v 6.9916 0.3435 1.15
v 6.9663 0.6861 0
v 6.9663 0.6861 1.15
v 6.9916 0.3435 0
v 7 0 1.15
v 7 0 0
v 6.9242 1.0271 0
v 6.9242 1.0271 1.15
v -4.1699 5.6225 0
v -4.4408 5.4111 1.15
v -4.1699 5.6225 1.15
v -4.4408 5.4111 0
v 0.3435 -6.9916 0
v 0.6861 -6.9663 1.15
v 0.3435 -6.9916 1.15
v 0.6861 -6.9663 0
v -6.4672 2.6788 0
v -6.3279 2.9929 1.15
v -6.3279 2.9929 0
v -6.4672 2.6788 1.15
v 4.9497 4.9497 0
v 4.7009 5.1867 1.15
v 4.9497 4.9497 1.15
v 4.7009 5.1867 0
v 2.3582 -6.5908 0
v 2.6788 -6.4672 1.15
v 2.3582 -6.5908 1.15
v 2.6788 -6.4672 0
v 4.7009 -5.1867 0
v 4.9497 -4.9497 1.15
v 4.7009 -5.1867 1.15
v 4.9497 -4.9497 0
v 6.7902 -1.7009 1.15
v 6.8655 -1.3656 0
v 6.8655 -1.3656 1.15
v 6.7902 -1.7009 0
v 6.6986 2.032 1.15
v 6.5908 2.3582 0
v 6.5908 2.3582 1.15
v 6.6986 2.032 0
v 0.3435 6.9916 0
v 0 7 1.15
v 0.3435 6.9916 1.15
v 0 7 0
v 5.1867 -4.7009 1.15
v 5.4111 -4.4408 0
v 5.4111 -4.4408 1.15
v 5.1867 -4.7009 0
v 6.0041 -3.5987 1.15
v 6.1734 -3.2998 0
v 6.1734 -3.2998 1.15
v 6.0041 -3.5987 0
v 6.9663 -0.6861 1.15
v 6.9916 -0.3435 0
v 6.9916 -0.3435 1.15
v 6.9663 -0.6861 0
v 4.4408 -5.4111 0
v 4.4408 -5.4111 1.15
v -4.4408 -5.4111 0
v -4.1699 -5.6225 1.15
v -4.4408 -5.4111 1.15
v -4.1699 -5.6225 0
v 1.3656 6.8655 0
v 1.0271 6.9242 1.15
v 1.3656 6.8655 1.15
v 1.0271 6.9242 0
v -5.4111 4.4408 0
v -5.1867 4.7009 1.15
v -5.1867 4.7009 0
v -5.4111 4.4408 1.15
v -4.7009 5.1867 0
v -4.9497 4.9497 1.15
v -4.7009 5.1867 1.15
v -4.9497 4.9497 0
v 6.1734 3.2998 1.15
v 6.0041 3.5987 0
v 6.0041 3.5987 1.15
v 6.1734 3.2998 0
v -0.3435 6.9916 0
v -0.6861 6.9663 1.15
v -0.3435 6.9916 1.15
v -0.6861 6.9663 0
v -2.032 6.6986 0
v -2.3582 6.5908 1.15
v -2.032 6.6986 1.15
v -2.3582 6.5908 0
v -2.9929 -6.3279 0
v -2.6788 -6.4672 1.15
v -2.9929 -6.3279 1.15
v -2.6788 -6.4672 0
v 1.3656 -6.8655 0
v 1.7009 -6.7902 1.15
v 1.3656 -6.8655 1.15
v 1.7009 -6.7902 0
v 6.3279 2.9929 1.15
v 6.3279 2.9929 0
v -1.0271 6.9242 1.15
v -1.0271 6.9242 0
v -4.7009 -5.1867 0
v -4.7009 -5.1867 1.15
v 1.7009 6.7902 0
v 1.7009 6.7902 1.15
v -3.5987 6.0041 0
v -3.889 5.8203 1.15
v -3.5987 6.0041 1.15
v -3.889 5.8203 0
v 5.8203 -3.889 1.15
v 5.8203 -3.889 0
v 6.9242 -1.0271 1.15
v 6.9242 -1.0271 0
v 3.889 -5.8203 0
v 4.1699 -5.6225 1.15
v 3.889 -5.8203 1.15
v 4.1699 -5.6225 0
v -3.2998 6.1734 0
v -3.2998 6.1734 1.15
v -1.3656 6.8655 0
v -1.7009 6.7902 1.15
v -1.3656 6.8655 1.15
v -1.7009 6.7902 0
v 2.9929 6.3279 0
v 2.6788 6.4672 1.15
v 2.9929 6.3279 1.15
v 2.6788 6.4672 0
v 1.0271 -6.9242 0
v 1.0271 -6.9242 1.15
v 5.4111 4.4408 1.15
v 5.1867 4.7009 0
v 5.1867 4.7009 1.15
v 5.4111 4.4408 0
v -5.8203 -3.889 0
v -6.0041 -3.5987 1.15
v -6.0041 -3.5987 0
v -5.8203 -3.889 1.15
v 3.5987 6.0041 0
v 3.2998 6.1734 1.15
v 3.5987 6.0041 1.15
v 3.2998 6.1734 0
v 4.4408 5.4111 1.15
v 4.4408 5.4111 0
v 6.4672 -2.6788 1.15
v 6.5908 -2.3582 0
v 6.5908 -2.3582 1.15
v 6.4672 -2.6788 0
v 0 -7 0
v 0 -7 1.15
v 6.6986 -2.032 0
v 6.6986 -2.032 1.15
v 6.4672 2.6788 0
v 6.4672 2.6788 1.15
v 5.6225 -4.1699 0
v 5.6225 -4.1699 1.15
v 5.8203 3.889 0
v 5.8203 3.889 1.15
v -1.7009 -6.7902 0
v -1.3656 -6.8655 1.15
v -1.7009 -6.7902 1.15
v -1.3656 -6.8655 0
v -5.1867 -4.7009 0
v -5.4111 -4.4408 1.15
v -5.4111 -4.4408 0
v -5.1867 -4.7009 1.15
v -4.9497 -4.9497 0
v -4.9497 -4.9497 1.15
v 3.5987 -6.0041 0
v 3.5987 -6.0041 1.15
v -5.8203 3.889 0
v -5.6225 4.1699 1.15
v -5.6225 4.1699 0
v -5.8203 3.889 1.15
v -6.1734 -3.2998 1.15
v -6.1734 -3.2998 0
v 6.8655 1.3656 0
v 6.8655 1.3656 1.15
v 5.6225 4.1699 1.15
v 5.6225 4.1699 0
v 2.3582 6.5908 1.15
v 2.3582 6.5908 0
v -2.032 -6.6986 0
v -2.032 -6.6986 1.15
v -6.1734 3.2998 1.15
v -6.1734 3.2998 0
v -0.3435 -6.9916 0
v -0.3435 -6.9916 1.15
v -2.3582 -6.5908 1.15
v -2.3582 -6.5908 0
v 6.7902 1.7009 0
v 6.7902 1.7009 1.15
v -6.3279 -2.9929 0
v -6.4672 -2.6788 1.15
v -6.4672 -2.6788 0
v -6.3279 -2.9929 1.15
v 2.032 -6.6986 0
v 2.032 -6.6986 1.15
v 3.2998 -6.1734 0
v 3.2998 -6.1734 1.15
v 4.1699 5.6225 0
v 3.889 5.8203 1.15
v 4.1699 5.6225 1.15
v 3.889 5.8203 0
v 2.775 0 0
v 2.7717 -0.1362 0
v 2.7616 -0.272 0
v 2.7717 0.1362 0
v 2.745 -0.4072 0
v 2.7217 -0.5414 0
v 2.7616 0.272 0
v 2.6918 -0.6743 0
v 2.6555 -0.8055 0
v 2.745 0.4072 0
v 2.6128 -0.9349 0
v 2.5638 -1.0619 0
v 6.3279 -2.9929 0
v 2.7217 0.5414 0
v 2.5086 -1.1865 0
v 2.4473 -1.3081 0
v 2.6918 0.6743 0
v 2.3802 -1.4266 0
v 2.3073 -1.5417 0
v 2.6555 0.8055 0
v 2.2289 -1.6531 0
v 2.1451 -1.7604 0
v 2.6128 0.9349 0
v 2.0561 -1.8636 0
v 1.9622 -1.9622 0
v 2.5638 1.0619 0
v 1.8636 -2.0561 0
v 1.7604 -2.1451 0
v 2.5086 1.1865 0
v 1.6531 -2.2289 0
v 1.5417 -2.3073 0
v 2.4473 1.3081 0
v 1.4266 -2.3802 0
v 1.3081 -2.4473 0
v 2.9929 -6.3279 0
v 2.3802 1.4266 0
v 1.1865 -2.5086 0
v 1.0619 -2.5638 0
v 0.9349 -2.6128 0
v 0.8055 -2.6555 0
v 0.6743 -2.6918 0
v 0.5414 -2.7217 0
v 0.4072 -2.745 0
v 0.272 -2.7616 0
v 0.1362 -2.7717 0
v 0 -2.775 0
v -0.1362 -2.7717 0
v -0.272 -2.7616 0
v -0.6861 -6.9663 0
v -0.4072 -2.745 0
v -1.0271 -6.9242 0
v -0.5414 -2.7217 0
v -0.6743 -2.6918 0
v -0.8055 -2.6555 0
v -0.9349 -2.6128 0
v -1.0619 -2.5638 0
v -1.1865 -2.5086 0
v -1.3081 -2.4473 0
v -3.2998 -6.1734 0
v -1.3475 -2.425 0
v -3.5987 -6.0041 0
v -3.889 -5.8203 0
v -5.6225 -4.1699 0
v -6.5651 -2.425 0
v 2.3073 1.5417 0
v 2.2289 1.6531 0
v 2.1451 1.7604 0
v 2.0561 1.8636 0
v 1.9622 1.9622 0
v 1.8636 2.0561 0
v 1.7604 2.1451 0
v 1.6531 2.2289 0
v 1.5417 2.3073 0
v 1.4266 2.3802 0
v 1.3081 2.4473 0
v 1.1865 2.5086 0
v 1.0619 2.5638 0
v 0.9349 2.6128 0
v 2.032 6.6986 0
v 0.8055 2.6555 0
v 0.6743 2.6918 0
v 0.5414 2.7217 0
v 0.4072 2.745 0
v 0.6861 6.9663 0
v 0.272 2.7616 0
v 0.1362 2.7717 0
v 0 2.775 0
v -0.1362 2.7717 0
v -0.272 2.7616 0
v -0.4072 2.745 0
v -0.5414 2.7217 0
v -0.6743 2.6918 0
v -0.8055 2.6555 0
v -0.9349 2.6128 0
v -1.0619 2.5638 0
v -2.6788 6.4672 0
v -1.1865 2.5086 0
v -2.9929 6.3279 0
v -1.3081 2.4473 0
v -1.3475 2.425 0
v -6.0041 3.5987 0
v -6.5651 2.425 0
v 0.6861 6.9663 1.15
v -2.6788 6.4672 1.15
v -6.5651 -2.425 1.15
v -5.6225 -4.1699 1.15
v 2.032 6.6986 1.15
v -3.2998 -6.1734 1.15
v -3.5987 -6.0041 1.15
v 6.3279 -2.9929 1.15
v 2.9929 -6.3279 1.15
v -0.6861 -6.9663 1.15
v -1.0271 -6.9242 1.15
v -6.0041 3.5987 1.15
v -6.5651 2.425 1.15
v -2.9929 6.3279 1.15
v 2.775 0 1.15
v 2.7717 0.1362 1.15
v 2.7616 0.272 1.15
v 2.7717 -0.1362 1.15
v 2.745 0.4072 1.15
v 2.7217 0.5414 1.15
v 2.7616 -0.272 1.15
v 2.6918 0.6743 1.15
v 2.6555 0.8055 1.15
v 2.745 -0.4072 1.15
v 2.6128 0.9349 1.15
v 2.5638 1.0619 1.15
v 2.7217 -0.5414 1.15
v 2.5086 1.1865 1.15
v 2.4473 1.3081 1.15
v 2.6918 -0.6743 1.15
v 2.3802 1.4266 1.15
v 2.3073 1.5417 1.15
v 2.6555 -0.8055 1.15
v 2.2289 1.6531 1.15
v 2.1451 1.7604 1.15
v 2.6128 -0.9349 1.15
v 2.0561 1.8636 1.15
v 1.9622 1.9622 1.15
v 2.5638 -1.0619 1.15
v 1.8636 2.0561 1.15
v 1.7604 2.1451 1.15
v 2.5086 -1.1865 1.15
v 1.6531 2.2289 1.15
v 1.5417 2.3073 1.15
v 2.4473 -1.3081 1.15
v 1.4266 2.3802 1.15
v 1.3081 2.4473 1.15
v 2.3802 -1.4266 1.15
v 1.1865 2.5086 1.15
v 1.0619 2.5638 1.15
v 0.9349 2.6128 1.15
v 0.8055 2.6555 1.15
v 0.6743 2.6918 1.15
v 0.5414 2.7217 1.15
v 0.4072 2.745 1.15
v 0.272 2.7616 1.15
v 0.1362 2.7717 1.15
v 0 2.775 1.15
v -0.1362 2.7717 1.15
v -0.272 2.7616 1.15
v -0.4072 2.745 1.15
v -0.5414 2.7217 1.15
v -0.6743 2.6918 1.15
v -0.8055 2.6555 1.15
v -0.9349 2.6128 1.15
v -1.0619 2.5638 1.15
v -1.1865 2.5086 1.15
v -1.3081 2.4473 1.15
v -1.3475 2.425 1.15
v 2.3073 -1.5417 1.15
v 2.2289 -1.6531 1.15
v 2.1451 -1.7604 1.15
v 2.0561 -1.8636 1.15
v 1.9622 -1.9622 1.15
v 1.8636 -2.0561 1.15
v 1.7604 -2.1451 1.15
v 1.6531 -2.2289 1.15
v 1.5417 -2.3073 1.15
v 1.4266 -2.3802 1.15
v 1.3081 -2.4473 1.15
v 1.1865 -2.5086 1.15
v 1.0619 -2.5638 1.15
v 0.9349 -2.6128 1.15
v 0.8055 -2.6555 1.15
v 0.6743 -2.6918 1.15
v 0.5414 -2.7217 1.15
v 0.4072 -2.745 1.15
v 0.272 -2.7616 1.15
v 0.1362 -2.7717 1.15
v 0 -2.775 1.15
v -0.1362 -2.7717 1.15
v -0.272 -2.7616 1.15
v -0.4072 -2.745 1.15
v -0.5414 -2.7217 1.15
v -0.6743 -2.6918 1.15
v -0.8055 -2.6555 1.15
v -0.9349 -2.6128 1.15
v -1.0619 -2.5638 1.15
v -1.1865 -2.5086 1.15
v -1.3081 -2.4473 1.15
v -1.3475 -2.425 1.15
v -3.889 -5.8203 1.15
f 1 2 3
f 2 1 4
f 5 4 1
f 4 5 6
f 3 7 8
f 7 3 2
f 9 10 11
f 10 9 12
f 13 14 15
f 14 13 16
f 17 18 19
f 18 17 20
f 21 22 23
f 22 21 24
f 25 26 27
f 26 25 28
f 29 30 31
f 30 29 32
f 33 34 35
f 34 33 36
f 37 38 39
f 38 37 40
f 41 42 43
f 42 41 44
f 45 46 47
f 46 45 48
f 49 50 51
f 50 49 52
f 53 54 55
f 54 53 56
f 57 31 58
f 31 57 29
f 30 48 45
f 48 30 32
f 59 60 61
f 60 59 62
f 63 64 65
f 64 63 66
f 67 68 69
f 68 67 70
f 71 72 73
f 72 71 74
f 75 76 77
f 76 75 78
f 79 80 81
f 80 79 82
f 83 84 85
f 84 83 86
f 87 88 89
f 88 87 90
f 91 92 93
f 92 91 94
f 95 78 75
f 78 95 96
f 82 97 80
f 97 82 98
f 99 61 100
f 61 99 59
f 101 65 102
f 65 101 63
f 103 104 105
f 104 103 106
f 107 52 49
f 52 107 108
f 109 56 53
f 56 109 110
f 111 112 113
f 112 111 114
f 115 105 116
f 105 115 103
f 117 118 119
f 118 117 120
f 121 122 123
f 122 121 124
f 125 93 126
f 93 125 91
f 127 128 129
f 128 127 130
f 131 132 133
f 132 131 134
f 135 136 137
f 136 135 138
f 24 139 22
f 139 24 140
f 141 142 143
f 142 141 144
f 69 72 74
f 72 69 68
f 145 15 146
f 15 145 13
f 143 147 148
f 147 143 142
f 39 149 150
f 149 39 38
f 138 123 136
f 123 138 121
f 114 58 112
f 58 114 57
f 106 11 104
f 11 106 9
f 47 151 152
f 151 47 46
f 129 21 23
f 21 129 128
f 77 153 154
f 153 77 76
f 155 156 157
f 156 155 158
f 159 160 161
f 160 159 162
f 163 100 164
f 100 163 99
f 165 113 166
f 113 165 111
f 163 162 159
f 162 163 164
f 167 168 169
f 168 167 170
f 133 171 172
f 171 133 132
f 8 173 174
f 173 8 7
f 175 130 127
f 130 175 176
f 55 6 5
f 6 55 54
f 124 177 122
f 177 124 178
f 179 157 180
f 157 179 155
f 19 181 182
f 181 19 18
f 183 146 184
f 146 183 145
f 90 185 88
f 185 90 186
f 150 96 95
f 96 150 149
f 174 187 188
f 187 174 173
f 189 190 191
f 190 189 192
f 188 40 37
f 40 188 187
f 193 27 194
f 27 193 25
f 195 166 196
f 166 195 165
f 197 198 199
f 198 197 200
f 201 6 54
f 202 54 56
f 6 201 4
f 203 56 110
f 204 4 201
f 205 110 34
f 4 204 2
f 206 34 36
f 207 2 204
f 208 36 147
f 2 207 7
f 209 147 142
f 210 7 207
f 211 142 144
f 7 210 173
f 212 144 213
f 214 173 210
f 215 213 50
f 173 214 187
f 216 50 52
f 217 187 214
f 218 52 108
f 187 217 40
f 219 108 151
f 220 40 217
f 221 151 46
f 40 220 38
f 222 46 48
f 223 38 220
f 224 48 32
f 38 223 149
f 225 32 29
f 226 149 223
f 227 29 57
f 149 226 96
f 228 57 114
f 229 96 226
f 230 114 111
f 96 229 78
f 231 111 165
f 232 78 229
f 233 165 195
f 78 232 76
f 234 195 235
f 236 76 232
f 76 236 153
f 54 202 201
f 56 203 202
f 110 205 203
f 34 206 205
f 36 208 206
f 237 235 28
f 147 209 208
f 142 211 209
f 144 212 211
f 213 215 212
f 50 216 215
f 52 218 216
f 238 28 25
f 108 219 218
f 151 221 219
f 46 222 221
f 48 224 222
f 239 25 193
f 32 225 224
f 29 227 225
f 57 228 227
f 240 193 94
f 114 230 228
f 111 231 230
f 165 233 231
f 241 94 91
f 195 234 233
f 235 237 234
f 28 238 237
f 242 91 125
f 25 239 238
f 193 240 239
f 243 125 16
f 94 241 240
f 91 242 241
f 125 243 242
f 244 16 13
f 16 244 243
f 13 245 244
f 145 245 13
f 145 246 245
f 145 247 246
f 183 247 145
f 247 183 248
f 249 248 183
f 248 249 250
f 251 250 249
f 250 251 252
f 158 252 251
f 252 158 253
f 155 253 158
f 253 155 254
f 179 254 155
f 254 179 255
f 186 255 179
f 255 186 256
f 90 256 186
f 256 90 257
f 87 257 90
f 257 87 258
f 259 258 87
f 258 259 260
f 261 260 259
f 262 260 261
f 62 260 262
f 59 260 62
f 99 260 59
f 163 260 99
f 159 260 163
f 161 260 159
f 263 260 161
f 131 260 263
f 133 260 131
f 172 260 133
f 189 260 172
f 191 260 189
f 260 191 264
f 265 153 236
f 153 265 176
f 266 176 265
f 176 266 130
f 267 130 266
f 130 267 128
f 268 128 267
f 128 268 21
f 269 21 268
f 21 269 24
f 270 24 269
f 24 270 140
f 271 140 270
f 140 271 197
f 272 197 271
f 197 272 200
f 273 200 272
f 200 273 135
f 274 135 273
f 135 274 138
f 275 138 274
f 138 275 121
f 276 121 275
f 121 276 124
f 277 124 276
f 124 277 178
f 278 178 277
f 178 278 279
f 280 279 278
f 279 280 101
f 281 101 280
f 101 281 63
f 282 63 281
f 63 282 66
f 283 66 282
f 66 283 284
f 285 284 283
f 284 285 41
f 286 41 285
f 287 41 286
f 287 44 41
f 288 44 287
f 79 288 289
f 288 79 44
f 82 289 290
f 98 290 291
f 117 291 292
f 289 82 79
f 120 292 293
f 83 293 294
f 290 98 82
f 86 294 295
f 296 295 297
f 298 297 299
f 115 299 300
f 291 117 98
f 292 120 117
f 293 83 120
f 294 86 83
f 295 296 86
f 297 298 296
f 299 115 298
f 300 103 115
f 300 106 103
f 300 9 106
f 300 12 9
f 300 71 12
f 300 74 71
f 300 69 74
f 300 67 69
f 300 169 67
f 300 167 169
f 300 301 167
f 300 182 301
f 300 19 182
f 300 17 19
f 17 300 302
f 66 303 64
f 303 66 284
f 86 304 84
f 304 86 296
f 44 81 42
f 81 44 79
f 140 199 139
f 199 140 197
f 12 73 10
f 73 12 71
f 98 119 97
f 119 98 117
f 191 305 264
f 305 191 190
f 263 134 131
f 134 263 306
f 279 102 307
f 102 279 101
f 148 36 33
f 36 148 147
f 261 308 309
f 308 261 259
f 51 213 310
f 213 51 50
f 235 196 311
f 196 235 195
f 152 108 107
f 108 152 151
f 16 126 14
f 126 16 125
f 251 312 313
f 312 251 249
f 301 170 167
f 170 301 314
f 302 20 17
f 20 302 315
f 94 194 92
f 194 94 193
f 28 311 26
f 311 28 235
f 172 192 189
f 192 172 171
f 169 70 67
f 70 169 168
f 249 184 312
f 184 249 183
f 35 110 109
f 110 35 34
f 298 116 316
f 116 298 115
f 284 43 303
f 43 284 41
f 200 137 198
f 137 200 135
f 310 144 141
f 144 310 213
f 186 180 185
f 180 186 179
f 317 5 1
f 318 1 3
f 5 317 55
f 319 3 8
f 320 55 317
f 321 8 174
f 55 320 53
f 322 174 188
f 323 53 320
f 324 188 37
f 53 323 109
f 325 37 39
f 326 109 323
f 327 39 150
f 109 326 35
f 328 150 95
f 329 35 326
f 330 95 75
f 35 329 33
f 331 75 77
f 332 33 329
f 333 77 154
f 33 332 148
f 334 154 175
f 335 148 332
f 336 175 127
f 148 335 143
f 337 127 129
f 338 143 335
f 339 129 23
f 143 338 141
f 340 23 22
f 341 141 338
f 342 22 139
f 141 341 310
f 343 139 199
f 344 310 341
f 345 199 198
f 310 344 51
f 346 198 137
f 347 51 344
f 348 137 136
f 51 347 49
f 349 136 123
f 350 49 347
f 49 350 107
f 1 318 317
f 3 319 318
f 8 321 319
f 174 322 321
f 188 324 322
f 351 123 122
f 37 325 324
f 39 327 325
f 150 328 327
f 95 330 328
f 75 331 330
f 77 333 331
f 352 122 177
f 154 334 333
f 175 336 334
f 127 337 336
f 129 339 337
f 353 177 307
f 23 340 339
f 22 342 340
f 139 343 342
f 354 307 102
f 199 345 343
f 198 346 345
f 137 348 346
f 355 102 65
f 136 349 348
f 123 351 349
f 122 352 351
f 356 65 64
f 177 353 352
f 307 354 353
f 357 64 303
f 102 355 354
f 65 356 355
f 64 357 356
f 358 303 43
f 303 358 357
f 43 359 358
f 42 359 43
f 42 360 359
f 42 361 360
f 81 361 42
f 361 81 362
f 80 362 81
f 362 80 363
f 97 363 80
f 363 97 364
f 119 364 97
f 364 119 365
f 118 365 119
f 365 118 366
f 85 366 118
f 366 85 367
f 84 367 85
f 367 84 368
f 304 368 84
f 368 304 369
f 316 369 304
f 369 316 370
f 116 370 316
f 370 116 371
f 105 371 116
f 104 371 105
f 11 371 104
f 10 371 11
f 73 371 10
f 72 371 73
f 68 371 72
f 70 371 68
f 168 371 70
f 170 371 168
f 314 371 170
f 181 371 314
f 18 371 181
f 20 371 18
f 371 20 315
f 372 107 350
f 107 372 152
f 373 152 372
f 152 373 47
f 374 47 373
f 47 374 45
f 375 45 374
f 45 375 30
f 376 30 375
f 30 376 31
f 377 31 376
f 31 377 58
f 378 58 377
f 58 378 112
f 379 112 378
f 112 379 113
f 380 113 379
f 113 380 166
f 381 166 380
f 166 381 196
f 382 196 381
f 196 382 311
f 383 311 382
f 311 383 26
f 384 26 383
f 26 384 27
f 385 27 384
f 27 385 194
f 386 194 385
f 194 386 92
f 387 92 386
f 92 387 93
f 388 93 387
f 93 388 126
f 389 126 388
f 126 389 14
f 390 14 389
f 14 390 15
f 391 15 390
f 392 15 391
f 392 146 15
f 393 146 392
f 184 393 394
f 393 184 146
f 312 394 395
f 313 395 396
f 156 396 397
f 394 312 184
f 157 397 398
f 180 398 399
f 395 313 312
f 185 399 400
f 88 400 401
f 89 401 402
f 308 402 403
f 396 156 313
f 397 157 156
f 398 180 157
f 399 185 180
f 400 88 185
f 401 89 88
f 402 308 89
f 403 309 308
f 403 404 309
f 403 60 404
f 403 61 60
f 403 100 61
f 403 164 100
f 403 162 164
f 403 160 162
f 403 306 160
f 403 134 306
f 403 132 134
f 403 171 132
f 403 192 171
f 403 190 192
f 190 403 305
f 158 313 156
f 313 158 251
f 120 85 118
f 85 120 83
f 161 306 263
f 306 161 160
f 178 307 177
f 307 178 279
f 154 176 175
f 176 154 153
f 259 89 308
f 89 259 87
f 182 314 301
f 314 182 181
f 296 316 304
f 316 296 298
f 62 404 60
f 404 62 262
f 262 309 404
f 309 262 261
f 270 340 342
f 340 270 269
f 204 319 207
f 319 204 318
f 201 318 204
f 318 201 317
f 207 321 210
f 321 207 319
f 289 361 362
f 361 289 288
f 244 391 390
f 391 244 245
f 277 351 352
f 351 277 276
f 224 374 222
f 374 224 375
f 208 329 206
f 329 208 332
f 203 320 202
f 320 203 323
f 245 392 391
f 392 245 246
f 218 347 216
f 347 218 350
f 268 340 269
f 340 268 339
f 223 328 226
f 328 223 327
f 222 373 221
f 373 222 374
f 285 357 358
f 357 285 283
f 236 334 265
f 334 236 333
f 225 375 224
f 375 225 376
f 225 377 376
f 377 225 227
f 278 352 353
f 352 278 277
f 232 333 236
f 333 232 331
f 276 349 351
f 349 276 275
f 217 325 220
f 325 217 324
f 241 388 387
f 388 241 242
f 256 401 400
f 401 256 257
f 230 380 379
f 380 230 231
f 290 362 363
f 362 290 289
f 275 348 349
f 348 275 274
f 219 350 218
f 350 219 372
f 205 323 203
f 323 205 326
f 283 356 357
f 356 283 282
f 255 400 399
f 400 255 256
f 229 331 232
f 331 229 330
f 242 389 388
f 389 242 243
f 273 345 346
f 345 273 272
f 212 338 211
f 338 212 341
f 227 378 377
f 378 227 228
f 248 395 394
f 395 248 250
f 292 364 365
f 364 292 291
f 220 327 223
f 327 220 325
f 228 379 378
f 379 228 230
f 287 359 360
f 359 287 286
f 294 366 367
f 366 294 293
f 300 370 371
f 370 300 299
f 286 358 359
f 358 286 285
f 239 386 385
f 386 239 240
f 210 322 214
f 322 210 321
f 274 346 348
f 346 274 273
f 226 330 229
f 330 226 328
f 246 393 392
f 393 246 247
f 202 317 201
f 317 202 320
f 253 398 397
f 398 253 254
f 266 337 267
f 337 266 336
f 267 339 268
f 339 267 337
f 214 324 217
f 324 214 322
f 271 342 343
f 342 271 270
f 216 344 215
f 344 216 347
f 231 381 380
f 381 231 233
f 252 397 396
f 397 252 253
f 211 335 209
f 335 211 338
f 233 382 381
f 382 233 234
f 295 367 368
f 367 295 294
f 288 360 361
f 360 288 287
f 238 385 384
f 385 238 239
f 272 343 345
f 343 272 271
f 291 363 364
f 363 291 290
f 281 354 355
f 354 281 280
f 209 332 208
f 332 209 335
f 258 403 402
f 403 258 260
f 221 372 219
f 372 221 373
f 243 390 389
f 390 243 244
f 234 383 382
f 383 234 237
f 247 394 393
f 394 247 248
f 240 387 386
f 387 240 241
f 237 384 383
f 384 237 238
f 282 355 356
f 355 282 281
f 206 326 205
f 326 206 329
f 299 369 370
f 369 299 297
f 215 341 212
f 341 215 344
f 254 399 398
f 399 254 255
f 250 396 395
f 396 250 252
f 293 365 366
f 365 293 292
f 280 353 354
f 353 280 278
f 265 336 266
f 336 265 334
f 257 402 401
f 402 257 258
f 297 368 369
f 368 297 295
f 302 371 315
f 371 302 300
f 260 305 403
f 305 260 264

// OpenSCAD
// P24 side-install C-retainer: slides into a narrow groove in new button.
// Does NOT need to be stretched over full button stem diameter.
$fn=128;
od=14.0;
id=5.55;
mouth=4.85; // narrow side opening retains 5.25mm groove
thickness=1.15;
difference(){
 cylinder(d=od,h=thickness);
 translate([0,0,-0.1])cylinder(d=id,h=thickness+0.2);
 translate([-od/2-0.2,-mouth/2,-0.1])cube([od/2+0.4,mouth,thickness+0.2]);
}
